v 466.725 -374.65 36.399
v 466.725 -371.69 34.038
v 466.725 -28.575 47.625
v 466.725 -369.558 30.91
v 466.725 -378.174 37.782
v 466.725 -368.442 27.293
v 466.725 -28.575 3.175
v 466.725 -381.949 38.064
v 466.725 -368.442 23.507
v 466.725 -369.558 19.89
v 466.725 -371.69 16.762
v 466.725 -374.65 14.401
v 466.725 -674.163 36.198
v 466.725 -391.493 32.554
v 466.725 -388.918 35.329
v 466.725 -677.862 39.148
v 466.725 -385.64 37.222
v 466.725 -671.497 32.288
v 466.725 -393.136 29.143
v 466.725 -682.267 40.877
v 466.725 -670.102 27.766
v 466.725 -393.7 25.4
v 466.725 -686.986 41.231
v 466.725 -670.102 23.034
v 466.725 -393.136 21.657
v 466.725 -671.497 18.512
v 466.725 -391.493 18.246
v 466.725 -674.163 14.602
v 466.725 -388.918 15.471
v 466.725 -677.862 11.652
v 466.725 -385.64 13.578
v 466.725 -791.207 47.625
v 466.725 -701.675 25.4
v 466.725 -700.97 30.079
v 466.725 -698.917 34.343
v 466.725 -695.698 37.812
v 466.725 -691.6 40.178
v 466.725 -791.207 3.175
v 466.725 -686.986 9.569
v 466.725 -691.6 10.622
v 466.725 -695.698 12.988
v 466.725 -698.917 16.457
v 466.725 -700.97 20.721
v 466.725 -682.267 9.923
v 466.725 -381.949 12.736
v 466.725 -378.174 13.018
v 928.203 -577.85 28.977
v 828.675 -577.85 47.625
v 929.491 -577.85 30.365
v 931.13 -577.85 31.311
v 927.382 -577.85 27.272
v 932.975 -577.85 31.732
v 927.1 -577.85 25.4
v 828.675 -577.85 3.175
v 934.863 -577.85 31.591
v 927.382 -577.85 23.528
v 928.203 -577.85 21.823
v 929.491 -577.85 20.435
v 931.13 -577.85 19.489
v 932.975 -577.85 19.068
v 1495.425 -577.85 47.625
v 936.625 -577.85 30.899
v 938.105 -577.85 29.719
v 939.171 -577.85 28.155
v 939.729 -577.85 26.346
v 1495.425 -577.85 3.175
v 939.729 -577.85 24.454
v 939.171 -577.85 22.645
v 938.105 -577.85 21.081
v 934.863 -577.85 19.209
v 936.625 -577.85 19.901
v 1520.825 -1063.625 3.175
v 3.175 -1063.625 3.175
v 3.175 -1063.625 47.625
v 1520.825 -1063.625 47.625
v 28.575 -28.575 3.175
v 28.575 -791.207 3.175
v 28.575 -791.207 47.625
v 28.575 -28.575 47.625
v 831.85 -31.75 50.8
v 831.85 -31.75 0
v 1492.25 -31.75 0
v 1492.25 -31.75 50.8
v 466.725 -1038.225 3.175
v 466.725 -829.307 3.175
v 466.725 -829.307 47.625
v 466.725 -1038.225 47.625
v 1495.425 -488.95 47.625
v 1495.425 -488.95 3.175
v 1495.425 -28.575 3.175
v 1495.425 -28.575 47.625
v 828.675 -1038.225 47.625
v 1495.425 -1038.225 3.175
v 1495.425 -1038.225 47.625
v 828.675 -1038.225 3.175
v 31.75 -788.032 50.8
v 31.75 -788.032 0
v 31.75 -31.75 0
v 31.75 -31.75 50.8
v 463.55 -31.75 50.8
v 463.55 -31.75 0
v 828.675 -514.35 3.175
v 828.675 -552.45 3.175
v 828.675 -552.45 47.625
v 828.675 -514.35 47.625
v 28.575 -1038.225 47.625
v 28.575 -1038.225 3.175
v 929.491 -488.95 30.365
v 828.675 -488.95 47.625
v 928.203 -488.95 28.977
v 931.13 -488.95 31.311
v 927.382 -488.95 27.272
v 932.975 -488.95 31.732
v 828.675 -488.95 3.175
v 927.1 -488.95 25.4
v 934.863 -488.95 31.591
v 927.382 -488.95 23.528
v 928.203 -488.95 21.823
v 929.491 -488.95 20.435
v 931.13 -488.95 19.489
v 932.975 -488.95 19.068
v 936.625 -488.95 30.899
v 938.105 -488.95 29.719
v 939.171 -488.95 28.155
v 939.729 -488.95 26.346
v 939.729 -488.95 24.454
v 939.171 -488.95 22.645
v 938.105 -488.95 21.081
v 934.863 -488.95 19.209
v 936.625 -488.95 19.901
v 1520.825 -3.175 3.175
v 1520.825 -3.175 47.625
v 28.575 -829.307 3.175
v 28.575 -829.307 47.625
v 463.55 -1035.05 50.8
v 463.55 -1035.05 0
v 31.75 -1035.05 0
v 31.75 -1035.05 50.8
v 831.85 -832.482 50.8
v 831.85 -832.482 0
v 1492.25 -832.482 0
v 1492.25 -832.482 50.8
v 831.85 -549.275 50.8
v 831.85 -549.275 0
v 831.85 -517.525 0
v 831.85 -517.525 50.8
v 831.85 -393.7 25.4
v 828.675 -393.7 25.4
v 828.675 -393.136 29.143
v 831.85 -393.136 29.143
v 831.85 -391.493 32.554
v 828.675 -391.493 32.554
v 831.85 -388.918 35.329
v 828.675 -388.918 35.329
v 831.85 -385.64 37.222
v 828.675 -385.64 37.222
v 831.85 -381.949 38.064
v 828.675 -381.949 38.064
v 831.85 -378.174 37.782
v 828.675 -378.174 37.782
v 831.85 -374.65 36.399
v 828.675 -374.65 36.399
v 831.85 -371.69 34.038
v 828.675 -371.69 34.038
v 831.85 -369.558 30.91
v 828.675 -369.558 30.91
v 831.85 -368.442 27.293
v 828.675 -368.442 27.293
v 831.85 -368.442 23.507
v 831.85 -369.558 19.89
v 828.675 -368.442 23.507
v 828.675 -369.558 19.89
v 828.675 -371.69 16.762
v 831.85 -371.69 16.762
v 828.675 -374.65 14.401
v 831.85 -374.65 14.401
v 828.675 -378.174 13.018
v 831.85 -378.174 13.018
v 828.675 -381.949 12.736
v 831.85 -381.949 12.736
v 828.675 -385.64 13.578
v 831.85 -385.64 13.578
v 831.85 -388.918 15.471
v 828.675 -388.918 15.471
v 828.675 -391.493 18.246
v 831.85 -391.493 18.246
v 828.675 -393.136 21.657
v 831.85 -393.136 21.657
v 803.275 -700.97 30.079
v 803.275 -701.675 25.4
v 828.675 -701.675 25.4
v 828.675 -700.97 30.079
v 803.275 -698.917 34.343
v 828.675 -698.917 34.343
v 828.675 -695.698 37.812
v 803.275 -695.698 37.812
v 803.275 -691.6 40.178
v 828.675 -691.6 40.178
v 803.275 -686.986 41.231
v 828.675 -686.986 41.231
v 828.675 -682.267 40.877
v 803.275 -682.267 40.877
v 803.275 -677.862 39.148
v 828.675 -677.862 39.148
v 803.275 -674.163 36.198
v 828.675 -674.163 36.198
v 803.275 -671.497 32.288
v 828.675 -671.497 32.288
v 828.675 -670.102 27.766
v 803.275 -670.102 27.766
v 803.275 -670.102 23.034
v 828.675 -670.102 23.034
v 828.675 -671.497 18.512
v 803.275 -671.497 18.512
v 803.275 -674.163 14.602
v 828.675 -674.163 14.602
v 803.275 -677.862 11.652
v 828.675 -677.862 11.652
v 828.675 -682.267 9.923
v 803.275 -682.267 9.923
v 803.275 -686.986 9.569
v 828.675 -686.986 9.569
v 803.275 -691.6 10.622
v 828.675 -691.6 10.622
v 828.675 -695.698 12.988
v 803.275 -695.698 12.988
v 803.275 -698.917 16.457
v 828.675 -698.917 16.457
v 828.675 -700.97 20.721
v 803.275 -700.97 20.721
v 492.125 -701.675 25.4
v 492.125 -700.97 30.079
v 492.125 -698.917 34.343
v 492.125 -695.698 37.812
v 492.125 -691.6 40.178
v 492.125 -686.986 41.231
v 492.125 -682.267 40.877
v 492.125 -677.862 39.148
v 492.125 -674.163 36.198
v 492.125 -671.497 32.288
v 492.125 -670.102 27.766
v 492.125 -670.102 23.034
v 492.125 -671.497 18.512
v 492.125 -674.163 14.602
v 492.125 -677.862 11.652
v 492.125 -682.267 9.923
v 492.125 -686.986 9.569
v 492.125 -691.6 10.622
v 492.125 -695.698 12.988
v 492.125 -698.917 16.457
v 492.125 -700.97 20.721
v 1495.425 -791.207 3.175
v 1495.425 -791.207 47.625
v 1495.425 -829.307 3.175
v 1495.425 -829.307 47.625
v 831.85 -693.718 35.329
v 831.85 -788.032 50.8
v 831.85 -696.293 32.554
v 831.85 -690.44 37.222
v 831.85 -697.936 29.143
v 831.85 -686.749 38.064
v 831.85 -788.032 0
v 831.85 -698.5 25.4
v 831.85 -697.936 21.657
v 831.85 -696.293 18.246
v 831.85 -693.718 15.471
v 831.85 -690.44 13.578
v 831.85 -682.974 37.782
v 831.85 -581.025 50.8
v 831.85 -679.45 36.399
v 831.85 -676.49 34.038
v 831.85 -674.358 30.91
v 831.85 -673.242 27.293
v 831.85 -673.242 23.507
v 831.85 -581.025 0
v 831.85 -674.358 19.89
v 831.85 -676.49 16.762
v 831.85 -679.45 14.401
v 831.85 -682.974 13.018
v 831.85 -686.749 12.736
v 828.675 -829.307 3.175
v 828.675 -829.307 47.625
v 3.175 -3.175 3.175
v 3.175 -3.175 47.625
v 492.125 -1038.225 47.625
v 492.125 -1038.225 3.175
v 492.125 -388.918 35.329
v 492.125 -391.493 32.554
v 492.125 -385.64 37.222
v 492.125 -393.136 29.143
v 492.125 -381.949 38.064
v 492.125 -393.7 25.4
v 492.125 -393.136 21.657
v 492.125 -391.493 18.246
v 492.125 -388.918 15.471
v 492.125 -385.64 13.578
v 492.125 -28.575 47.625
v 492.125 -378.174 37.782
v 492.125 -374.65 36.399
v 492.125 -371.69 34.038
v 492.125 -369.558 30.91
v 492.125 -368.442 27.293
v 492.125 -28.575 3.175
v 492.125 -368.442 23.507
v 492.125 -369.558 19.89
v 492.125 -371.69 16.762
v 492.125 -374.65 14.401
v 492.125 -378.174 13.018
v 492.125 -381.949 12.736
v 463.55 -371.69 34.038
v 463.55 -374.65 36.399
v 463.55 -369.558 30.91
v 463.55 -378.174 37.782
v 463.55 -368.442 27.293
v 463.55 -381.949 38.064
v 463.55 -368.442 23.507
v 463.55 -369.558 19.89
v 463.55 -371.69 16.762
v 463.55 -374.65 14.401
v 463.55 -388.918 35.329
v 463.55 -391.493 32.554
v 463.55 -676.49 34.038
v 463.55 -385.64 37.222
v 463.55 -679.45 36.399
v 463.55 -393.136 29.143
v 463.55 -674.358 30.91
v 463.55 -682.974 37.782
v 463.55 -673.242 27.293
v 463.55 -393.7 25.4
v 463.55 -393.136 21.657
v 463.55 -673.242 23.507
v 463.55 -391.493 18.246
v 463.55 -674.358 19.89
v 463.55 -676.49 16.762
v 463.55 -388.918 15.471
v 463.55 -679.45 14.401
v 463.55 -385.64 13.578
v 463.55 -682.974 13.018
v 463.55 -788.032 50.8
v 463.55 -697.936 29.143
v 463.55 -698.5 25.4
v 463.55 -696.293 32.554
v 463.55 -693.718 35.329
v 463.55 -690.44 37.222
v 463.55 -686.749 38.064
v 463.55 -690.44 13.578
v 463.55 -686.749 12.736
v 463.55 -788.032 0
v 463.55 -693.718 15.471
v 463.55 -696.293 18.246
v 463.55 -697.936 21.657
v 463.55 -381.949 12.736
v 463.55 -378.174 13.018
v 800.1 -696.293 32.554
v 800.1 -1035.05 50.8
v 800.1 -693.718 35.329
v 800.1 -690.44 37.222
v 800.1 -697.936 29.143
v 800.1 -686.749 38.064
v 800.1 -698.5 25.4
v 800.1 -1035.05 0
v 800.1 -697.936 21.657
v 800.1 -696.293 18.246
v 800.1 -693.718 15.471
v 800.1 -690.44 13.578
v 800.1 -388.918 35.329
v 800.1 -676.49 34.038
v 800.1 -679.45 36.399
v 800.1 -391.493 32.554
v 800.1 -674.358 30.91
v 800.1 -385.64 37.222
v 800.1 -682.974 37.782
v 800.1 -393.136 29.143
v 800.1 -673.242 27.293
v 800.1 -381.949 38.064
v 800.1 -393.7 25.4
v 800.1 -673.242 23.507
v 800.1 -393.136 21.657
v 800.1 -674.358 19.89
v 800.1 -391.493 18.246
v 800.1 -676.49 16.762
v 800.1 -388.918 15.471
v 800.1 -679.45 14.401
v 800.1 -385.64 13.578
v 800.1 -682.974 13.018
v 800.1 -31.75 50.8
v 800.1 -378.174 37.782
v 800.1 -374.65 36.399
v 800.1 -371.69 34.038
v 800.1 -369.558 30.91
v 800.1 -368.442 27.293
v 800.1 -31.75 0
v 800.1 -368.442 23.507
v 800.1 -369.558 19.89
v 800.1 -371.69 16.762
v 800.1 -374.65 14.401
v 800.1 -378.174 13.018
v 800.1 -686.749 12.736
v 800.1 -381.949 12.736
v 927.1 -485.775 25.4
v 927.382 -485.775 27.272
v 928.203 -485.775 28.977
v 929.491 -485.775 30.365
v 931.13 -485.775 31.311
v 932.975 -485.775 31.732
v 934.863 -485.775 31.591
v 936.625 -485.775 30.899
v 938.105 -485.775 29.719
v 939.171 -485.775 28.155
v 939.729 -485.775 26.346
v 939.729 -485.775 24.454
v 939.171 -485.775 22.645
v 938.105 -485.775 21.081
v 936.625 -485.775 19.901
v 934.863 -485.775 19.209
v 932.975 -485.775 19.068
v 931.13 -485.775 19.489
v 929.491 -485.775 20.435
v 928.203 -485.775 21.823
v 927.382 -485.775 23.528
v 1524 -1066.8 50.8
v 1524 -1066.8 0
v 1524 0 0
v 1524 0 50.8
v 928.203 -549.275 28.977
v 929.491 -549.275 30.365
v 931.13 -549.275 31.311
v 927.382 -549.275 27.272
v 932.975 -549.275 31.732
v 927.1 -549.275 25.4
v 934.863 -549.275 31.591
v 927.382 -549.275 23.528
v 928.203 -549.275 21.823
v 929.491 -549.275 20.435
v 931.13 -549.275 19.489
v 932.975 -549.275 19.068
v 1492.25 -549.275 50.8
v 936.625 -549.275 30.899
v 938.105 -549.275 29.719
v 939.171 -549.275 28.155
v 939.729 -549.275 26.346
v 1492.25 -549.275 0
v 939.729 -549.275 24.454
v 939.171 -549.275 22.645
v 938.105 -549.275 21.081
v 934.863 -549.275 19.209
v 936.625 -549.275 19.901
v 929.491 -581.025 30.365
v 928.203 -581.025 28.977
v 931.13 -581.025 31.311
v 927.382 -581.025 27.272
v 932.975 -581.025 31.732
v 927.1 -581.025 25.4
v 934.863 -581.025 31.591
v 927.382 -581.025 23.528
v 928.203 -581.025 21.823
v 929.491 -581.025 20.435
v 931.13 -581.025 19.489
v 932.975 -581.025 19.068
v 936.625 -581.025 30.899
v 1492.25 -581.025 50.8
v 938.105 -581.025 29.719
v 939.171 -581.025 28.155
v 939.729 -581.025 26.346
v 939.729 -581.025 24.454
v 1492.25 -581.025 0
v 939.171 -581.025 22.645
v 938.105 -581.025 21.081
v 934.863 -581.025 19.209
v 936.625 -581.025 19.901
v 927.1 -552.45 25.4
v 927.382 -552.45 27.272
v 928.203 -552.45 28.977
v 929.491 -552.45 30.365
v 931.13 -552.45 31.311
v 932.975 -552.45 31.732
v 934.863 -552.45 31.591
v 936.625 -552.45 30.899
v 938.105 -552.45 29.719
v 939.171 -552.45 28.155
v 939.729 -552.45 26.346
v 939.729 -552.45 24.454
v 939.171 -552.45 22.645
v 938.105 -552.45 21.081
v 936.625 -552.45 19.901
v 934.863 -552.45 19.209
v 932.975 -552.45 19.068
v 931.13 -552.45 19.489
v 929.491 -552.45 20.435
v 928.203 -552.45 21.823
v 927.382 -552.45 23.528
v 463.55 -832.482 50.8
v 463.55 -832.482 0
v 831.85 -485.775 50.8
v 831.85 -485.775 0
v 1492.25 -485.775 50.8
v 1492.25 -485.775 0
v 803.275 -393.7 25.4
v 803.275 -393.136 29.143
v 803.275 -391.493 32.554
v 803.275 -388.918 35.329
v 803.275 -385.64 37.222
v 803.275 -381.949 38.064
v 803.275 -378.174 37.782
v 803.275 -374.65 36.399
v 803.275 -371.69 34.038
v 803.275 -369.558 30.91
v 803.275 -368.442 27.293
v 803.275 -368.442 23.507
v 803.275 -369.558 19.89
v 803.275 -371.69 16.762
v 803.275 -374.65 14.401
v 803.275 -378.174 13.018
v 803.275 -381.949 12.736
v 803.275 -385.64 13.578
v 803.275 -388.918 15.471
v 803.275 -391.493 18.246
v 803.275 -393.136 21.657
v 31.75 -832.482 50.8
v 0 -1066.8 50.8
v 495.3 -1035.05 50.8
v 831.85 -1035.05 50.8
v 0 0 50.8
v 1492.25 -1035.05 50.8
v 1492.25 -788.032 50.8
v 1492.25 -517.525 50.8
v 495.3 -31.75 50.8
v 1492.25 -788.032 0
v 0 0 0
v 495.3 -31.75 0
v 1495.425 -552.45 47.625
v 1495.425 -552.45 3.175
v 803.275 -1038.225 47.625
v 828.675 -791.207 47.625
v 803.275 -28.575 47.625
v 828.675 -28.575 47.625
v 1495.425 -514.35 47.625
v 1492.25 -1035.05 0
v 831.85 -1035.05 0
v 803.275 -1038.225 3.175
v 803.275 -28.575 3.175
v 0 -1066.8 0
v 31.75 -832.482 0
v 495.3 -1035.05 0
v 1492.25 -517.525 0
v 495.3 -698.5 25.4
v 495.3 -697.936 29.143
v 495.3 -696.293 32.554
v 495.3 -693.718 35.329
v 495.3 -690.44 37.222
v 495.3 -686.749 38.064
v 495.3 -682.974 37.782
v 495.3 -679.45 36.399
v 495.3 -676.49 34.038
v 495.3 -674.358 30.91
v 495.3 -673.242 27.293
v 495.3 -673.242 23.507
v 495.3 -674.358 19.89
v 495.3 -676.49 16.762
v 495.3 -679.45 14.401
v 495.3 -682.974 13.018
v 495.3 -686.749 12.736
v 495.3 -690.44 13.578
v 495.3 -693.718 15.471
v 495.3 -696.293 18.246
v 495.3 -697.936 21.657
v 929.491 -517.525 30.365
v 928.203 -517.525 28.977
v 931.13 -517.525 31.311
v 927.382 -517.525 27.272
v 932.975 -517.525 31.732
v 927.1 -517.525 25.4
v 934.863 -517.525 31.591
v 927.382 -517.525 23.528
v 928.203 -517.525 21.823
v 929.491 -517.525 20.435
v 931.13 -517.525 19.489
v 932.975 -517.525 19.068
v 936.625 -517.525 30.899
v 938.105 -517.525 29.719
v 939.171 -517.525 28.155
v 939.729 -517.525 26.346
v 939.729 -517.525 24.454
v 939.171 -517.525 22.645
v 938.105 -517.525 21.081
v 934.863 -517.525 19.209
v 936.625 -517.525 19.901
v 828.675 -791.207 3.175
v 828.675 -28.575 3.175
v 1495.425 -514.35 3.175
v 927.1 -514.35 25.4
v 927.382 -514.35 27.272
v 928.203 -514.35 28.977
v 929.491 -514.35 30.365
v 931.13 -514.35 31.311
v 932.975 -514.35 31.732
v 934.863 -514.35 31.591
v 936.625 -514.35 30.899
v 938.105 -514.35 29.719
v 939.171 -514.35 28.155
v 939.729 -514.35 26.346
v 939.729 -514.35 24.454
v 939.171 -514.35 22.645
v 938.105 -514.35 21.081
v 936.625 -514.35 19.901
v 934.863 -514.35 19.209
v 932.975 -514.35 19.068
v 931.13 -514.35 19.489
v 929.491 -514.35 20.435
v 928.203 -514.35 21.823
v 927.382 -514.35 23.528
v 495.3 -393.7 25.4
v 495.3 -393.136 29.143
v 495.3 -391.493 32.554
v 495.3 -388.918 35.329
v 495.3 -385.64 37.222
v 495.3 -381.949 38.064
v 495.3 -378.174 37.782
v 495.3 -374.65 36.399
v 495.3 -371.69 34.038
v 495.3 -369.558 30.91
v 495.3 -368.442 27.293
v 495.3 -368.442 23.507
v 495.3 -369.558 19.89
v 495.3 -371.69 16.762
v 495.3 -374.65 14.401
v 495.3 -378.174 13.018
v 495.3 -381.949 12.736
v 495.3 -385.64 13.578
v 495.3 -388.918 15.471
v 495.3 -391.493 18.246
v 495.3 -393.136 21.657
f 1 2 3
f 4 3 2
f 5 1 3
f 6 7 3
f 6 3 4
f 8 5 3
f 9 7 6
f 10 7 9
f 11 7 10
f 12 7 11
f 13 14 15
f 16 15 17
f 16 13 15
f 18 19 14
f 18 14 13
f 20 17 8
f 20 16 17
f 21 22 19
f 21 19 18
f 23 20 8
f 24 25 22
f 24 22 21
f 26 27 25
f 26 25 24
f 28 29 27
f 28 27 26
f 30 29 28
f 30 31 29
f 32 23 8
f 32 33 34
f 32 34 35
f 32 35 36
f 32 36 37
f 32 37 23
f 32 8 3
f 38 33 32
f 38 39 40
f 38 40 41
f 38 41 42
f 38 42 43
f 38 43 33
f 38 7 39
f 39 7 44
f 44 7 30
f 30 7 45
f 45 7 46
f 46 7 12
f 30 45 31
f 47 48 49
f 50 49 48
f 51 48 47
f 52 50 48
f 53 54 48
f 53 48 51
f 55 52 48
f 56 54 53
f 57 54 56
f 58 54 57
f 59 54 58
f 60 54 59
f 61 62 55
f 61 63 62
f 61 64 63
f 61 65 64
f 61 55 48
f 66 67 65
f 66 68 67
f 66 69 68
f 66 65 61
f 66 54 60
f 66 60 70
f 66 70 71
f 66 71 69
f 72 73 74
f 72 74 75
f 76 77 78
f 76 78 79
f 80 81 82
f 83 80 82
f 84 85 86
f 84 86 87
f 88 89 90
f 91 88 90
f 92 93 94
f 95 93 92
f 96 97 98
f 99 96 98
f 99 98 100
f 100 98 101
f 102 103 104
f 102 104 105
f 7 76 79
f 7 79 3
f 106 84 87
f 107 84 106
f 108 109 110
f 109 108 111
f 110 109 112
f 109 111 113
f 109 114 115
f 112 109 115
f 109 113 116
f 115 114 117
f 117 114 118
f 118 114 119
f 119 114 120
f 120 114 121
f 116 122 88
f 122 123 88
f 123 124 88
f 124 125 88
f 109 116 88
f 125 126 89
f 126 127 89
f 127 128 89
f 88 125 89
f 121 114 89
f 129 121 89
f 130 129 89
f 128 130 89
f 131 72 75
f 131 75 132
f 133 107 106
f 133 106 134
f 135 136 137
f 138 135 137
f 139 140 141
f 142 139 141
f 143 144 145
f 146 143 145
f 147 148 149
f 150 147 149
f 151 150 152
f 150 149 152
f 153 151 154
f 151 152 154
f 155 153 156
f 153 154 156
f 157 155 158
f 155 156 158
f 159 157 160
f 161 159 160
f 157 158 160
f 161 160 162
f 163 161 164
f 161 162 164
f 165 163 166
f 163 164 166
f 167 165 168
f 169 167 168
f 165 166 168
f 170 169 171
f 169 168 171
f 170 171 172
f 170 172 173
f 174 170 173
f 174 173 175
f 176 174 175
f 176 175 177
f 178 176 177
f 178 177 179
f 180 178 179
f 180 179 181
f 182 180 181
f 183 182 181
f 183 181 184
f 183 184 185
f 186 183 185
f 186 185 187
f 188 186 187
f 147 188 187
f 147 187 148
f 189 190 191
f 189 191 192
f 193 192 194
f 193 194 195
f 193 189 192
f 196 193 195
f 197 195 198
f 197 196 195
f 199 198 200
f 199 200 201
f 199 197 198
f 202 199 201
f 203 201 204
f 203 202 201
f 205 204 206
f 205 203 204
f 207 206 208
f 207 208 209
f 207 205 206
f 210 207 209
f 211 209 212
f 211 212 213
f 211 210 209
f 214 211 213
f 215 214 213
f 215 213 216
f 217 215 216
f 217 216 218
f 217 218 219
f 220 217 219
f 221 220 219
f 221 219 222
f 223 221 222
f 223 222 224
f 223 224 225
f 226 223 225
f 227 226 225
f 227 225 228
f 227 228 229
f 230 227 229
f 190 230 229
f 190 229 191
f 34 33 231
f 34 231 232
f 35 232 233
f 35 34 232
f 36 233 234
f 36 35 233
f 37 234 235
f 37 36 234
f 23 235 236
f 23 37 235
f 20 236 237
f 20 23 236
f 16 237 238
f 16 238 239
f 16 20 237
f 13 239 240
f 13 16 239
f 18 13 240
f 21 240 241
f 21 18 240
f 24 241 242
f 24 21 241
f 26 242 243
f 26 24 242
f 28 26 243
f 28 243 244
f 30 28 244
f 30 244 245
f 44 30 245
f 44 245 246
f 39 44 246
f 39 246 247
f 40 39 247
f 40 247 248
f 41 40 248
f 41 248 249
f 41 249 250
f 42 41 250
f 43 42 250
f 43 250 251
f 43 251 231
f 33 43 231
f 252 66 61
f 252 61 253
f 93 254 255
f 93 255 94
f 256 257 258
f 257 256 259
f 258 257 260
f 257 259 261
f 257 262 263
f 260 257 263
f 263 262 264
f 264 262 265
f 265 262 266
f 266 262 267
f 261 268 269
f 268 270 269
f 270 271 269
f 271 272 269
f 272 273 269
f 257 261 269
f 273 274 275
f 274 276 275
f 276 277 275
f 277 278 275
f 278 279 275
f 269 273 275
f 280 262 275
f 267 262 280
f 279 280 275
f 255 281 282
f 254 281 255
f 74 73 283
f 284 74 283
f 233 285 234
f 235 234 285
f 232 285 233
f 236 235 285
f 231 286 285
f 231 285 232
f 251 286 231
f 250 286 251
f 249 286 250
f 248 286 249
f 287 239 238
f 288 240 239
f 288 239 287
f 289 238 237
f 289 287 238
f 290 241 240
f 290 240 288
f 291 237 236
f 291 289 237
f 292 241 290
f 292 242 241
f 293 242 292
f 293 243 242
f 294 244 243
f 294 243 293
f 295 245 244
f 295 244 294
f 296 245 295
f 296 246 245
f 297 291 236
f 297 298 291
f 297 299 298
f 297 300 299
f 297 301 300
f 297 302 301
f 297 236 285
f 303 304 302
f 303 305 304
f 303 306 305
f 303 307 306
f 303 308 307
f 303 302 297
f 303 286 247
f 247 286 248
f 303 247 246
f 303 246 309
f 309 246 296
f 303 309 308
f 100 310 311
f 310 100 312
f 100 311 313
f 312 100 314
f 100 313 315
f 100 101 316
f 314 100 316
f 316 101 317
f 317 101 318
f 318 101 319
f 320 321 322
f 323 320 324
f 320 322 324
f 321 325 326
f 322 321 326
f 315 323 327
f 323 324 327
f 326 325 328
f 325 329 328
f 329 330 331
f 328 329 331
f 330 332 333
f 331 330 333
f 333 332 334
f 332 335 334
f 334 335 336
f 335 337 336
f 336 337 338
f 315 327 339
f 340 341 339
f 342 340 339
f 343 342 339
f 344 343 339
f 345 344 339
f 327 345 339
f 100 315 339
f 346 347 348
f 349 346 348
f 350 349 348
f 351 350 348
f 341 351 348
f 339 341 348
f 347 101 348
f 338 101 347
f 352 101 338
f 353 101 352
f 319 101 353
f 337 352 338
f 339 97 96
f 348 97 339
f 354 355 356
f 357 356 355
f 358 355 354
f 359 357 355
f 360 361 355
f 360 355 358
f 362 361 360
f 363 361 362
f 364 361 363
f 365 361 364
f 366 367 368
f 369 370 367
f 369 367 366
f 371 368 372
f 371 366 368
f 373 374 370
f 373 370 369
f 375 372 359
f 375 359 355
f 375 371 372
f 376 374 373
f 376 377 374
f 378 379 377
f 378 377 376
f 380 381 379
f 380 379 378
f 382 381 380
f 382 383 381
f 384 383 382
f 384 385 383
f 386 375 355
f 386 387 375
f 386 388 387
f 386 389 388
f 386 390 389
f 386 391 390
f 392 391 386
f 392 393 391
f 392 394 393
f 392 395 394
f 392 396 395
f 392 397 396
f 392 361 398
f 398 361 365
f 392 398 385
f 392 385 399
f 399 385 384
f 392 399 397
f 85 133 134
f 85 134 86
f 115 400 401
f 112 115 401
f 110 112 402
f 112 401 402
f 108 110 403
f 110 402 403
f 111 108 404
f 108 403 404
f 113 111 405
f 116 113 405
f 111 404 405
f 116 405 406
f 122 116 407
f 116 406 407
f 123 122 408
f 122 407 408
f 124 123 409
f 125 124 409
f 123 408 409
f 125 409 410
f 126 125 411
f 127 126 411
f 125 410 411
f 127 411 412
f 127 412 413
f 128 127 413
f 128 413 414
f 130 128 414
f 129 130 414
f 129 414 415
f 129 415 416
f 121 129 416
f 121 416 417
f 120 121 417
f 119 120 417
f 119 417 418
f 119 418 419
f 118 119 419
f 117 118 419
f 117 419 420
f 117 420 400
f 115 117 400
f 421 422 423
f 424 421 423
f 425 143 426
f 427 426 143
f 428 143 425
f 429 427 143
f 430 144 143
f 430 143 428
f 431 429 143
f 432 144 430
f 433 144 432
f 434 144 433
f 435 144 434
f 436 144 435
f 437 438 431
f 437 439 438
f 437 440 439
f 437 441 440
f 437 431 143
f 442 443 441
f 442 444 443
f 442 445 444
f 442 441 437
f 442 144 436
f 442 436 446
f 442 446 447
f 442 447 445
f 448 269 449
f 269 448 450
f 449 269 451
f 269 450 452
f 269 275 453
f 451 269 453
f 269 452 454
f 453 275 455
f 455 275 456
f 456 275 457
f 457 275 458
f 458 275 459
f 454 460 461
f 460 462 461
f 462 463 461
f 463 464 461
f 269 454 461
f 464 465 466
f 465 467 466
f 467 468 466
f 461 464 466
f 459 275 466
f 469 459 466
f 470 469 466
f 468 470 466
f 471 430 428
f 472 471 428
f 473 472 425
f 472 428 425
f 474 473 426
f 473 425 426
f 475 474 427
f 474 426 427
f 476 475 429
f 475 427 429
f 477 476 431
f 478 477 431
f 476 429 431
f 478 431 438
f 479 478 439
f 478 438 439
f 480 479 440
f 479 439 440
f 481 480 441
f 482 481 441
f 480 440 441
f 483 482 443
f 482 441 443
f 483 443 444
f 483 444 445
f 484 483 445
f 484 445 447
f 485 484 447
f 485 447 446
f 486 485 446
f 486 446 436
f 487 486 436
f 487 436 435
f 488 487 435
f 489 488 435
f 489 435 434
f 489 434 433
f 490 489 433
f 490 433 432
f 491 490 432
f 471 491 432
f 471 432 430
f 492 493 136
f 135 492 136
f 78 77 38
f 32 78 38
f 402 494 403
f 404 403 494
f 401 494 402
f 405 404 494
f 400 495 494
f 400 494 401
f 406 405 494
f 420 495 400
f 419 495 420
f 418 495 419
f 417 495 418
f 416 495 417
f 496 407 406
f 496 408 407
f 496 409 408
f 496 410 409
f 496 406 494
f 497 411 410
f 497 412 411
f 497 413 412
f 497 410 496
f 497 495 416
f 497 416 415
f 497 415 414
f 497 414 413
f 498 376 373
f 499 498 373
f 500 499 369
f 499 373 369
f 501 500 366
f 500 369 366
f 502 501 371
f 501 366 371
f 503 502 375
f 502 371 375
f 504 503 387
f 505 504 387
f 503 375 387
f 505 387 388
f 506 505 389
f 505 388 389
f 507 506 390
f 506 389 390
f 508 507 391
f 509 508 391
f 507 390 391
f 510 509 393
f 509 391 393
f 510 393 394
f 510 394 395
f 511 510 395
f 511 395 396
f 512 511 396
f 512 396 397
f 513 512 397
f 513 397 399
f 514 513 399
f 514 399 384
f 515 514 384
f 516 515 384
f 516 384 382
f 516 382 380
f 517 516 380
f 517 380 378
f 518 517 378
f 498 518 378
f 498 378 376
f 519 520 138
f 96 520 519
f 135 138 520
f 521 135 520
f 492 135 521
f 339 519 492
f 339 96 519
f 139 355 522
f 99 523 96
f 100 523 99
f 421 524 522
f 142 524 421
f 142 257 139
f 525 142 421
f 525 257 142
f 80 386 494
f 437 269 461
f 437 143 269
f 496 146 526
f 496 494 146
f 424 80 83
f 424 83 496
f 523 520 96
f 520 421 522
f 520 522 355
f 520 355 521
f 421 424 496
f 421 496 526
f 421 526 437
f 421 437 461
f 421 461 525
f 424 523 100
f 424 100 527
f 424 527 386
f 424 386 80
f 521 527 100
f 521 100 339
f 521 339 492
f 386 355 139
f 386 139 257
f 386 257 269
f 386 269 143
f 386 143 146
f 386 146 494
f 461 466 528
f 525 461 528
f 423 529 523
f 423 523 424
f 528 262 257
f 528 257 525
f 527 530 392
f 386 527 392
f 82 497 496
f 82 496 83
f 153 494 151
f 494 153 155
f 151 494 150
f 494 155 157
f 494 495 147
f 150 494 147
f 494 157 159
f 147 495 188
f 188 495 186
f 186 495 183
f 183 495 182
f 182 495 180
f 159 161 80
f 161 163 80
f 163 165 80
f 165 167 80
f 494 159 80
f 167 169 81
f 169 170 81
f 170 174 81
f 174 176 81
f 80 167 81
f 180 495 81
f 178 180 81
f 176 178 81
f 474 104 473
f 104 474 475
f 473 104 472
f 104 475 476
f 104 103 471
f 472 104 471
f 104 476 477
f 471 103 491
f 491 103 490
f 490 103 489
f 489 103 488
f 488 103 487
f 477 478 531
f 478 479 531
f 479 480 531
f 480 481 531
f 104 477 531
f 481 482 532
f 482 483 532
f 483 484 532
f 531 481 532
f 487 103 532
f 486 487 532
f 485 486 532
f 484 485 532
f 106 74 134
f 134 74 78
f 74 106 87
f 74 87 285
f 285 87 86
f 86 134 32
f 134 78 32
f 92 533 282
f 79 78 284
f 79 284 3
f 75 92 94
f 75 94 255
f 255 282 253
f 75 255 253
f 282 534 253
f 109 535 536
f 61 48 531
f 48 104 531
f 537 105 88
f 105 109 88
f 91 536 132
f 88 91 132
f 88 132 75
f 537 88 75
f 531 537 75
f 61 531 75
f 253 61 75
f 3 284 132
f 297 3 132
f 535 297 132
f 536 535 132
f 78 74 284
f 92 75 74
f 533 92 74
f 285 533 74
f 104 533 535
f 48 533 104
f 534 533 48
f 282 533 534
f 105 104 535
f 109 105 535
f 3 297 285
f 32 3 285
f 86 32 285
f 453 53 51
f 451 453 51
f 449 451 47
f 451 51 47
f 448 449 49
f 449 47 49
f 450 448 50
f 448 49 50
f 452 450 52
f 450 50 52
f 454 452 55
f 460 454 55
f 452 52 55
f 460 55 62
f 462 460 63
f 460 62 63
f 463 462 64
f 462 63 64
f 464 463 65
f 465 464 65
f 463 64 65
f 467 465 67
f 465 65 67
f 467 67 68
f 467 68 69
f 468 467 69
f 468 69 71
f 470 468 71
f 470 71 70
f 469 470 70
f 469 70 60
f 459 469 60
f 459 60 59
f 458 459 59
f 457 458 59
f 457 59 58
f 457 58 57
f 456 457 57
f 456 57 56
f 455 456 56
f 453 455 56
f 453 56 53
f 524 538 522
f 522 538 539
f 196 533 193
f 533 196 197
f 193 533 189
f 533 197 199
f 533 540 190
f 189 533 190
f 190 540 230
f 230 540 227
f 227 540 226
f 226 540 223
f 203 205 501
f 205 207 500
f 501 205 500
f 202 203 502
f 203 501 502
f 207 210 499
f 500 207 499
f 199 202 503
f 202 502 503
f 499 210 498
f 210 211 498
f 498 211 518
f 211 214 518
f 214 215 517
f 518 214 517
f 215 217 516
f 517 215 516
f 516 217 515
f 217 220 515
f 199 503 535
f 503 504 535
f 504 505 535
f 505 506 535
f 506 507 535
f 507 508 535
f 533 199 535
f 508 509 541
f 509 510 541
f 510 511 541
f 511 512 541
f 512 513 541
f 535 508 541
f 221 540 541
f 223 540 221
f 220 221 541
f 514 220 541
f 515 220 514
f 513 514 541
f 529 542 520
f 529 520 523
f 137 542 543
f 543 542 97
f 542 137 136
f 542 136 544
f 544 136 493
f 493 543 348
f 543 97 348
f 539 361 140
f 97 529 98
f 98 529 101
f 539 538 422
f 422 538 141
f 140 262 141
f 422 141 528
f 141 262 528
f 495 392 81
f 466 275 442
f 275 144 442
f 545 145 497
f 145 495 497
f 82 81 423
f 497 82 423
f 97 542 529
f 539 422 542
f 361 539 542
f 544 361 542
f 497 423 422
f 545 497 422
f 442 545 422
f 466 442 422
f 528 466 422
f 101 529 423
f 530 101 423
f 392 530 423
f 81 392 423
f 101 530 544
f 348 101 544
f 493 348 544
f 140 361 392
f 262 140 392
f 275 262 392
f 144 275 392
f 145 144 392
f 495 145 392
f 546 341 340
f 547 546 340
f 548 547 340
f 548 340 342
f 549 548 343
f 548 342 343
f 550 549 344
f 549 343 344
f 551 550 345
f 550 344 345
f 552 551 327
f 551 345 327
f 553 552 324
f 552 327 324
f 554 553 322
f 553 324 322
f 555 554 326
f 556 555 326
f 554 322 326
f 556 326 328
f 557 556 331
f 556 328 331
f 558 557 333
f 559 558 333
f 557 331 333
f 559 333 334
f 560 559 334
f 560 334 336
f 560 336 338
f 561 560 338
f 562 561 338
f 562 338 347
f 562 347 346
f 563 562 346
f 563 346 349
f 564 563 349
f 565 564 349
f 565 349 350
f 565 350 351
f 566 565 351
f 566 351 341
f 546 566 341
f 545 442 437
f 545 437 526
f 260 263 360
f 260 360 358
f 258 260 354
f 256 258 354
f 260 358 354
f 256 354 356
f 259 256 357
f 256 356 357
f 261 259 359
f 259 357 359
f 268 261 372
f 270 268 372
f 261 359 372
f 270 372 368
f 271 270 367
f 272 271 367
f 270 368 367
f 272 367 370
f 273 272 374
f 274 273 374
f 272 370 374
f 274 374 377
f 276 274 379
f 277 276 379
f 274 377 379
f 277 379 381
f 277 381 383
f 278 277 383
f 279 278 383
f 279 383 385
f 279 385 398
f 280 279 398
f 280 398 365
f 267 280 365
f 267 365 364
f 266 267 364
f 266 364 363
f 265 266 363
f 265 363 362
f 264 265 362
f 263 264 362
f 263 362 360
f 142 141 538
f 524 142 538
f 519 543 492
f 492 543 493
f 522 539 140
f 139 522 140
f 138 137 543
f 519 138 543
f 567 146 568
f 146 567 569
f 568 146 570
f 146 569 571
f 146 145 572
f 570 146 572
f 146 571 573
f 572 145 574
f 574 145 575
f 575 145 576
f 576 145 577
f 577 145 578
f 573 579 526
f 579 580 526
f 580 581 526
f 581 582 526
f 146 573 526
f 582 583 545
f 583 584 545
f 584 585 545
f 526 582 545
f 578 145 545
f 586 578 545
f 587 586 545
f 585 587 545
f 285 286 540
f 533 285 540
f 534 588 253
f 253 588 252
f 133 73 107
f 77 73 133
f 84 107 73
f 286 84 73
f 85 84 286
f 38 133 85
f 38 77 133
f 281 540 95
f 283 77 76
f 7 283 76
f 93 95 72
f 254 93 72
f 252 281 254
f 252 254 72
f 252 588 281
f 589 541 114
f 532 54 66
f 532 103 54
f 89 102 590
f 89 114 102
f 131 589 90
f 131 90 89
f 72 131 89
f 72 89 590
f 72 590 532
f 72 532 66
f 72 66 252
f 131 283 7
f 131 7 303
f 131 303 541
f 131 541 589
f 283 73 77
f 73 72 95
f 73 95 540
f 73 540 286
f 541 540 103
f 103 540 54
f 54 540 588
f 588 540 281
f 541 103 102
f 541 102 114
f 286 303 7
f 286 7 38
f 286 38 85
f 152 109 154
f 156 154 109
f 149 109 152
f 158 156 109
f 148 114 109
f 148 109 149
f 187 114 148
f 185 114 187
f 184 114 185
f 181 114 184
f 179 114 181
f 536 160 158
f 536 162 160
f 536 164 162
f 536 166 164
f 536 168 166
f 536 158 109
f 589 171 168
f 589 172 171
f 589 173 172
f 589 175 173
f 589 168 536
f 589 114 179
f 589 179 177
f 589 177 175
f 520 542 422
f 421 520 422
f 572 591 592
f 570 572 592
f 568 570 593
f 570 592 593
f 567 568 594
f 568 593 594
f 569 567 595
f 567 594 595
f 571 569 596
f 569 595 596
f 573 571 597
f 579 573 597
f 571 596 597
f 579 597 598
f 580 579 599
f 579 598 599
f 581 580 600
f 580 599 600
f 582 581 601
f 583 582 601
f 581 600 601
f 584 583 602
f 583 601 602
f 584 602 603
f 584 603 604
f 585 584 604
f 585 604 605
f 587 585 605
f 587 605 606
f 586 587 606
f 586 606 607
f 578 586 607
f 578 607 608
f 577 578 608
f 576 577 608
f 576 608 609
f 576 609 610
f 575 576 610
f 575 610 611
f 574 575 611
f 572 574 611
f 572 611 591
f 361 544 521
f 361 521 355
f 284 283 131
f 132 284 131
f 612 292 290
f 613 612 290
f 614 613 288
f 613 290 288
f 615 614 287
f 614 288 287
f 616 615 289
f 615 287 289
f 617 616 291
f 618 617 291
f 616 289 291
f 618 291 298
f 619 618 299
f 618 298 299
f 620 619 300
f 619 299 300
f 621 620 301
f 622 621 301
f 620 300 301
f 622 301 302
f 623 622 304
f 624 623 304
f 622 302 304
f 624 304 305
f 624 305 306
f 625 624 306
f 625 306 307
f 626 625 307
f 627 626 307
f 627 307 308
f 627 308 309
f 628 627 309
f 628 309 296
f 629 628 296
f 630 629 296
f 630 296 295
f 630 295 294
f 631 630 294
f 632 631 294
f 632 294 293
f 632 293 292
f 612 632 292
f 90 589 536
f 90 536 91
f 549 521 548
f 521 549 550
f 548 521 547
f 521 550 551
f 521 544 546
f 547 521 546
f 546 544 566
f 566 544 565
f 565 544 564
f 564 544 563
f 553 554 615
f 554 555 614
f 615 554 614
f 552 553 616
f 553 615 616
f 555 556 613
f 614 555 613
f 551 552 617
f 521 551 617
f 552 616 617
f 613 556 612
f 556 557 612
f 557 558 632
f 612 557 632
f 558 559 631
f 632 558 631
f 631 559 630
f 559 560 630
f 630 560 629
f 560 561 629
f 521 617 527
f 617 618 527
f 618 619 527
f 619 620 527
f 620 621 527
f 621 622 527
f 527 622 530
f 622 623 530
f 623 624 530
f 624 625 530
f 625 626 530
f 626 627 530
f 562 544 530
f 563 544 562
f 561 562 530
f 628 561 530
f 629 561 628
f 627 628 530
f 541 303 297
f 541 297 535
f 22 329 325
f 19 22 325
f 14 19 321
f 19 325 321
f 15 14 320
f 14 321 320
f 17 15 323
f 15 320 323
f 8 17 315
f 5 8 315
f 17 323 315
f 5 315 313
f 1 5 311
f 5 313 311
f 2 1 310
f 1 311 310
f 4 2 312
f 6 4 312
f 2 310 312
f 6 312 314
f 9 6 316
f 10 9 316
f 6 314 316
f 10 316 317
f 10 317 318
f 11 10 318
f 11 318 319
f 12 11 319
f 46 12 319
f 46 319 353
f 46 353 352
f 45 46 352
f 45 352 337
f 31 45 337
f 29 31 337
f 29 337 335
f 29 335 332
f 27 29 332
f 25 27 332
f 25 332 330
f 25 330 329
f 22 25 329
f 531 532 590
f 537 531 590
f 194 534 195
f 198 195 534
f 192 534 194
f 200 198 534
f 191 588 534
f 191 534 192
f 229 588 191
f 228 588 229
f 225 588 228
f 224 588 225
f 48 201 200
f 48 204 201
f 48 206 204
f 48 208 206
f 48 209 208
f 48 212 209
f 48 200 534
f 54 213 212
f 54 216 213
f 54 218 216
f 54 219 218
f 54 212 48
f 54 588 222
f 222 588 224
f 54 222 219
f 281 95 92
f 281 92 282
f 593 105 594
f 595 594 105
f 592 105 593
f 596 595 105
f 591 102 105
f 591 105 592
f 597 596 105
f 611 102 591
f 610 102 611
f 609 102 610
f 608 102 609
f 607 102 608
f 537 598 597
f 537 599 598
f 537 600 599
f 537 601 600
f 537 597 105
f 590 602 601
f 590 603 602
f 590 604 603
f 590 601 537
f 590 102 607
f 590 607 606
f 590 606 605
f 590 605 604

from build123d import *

# Parameters (mm, degrees)
F0_W     = 1524
F0_H     = 1066.8
F0_W_2   = 304.8
F0_H_2   = 1003.3
F0_W_3   = 660.4
F0_H_3   = 31.75
F0_H_4   = 454.025
F0_W_4   = 431.8
F0_H_5   = 44.45
F1_DEPTH = 50.8
F2_R     = 12.7
F3_DEPTH = 406.4
F4_R     = 6.35
F5_DEPTH = 127
F6_T     = -3.175


# Not quite as in the source:
# - a feature names something its author has since deleted; it is built from what else it names


with BuildPart() as f1:
    # F0 (on Top) → F1 (new body)
    with BuildSketch(Plane.XY):
        with Locations((762, -533.4)):
            Rectangle(F0_W, F0_H)
        Polygon((1492.25, -1035.05), (831.85, -1035.05), (831.85, -832.48246), (831.85, -788.03246), (831.85, -581.025), (1492.25, -581.025), (1492.25, -788.03246), (1492.25, -832.48246), align=None, mode=Mode.SUBTRACT)
        Polygon((31.75, -788.03246), (31.75, -31.75), (463.55, -31.75), (463.55, -788.03246), (463.55, -832.48246), (463.55, -1035.05), (31.75, -1035.05), (31.75, -832.48246), align=None, mode=Mode.SUBTRACT)
        with Locations((647.7, -533.4)):
            Rectangle(F0_W_2, F0_H_2, mode=Mode.SUBTRACT)
        with Locations((1162.05, -533.4)):
            Rectangle(F0_W_3, F0_H_3, mode=Mode.SUBTRACT)
        with Locations((1162.05, -258.7625)):
            Rectangle(F0_W_3, F0_H_4, mode=Mode.SUBTRACT)
        with Locations((247.65, -810.25746)):
            Rectangle(F0_W_4, F0_H_5)
        with Locations((1162.05, -810.25746)):
            Rectangle(F0_W_3, F0_H_5)
    extrude(amount=F1_DEPTH)

    # F2 (on face) → F3 (cut)
    with BuildSketch(Plane(origin=(463.55, 0, 0), x_dir=(0, -1, 0), z_dir=(-1, 0, 0))):
        with Locations((381, 25.4)):
            Circle(F2_R)
        with Locations((685.8, 25.4)):
            Circle(F2_R)
    extrude(amount=-F3_DEPTH, mode=Mode.SUBTRACT)

    # F4 (on face) → F5 (cut)
    with BuildSketch(Plane(origin=(0, -485.775, 0), x_dir=(-1, 0, 0), z_dir=(0, 1, 0))):
        with Locations((-933.45, 25.4)):
            Circle(F4_R)
    extrude(amount=-F5_DEPTH, mode=Mode.SUBTRACT)

    # F6
    f6_openings = [f1.faces().sort_by_distance(p)[0] for p in [
        (815.975, -368.3, 25.4),
        (479.425, -368.3, 25.4),
        (939.8, -565.15, 25.4),
        (939.8, -501.65, 25.4),
    ]]
    offset(amount=F6_T, openings=f6_openings, kind=Kind.INTERSECTION)


solid = f1.part
